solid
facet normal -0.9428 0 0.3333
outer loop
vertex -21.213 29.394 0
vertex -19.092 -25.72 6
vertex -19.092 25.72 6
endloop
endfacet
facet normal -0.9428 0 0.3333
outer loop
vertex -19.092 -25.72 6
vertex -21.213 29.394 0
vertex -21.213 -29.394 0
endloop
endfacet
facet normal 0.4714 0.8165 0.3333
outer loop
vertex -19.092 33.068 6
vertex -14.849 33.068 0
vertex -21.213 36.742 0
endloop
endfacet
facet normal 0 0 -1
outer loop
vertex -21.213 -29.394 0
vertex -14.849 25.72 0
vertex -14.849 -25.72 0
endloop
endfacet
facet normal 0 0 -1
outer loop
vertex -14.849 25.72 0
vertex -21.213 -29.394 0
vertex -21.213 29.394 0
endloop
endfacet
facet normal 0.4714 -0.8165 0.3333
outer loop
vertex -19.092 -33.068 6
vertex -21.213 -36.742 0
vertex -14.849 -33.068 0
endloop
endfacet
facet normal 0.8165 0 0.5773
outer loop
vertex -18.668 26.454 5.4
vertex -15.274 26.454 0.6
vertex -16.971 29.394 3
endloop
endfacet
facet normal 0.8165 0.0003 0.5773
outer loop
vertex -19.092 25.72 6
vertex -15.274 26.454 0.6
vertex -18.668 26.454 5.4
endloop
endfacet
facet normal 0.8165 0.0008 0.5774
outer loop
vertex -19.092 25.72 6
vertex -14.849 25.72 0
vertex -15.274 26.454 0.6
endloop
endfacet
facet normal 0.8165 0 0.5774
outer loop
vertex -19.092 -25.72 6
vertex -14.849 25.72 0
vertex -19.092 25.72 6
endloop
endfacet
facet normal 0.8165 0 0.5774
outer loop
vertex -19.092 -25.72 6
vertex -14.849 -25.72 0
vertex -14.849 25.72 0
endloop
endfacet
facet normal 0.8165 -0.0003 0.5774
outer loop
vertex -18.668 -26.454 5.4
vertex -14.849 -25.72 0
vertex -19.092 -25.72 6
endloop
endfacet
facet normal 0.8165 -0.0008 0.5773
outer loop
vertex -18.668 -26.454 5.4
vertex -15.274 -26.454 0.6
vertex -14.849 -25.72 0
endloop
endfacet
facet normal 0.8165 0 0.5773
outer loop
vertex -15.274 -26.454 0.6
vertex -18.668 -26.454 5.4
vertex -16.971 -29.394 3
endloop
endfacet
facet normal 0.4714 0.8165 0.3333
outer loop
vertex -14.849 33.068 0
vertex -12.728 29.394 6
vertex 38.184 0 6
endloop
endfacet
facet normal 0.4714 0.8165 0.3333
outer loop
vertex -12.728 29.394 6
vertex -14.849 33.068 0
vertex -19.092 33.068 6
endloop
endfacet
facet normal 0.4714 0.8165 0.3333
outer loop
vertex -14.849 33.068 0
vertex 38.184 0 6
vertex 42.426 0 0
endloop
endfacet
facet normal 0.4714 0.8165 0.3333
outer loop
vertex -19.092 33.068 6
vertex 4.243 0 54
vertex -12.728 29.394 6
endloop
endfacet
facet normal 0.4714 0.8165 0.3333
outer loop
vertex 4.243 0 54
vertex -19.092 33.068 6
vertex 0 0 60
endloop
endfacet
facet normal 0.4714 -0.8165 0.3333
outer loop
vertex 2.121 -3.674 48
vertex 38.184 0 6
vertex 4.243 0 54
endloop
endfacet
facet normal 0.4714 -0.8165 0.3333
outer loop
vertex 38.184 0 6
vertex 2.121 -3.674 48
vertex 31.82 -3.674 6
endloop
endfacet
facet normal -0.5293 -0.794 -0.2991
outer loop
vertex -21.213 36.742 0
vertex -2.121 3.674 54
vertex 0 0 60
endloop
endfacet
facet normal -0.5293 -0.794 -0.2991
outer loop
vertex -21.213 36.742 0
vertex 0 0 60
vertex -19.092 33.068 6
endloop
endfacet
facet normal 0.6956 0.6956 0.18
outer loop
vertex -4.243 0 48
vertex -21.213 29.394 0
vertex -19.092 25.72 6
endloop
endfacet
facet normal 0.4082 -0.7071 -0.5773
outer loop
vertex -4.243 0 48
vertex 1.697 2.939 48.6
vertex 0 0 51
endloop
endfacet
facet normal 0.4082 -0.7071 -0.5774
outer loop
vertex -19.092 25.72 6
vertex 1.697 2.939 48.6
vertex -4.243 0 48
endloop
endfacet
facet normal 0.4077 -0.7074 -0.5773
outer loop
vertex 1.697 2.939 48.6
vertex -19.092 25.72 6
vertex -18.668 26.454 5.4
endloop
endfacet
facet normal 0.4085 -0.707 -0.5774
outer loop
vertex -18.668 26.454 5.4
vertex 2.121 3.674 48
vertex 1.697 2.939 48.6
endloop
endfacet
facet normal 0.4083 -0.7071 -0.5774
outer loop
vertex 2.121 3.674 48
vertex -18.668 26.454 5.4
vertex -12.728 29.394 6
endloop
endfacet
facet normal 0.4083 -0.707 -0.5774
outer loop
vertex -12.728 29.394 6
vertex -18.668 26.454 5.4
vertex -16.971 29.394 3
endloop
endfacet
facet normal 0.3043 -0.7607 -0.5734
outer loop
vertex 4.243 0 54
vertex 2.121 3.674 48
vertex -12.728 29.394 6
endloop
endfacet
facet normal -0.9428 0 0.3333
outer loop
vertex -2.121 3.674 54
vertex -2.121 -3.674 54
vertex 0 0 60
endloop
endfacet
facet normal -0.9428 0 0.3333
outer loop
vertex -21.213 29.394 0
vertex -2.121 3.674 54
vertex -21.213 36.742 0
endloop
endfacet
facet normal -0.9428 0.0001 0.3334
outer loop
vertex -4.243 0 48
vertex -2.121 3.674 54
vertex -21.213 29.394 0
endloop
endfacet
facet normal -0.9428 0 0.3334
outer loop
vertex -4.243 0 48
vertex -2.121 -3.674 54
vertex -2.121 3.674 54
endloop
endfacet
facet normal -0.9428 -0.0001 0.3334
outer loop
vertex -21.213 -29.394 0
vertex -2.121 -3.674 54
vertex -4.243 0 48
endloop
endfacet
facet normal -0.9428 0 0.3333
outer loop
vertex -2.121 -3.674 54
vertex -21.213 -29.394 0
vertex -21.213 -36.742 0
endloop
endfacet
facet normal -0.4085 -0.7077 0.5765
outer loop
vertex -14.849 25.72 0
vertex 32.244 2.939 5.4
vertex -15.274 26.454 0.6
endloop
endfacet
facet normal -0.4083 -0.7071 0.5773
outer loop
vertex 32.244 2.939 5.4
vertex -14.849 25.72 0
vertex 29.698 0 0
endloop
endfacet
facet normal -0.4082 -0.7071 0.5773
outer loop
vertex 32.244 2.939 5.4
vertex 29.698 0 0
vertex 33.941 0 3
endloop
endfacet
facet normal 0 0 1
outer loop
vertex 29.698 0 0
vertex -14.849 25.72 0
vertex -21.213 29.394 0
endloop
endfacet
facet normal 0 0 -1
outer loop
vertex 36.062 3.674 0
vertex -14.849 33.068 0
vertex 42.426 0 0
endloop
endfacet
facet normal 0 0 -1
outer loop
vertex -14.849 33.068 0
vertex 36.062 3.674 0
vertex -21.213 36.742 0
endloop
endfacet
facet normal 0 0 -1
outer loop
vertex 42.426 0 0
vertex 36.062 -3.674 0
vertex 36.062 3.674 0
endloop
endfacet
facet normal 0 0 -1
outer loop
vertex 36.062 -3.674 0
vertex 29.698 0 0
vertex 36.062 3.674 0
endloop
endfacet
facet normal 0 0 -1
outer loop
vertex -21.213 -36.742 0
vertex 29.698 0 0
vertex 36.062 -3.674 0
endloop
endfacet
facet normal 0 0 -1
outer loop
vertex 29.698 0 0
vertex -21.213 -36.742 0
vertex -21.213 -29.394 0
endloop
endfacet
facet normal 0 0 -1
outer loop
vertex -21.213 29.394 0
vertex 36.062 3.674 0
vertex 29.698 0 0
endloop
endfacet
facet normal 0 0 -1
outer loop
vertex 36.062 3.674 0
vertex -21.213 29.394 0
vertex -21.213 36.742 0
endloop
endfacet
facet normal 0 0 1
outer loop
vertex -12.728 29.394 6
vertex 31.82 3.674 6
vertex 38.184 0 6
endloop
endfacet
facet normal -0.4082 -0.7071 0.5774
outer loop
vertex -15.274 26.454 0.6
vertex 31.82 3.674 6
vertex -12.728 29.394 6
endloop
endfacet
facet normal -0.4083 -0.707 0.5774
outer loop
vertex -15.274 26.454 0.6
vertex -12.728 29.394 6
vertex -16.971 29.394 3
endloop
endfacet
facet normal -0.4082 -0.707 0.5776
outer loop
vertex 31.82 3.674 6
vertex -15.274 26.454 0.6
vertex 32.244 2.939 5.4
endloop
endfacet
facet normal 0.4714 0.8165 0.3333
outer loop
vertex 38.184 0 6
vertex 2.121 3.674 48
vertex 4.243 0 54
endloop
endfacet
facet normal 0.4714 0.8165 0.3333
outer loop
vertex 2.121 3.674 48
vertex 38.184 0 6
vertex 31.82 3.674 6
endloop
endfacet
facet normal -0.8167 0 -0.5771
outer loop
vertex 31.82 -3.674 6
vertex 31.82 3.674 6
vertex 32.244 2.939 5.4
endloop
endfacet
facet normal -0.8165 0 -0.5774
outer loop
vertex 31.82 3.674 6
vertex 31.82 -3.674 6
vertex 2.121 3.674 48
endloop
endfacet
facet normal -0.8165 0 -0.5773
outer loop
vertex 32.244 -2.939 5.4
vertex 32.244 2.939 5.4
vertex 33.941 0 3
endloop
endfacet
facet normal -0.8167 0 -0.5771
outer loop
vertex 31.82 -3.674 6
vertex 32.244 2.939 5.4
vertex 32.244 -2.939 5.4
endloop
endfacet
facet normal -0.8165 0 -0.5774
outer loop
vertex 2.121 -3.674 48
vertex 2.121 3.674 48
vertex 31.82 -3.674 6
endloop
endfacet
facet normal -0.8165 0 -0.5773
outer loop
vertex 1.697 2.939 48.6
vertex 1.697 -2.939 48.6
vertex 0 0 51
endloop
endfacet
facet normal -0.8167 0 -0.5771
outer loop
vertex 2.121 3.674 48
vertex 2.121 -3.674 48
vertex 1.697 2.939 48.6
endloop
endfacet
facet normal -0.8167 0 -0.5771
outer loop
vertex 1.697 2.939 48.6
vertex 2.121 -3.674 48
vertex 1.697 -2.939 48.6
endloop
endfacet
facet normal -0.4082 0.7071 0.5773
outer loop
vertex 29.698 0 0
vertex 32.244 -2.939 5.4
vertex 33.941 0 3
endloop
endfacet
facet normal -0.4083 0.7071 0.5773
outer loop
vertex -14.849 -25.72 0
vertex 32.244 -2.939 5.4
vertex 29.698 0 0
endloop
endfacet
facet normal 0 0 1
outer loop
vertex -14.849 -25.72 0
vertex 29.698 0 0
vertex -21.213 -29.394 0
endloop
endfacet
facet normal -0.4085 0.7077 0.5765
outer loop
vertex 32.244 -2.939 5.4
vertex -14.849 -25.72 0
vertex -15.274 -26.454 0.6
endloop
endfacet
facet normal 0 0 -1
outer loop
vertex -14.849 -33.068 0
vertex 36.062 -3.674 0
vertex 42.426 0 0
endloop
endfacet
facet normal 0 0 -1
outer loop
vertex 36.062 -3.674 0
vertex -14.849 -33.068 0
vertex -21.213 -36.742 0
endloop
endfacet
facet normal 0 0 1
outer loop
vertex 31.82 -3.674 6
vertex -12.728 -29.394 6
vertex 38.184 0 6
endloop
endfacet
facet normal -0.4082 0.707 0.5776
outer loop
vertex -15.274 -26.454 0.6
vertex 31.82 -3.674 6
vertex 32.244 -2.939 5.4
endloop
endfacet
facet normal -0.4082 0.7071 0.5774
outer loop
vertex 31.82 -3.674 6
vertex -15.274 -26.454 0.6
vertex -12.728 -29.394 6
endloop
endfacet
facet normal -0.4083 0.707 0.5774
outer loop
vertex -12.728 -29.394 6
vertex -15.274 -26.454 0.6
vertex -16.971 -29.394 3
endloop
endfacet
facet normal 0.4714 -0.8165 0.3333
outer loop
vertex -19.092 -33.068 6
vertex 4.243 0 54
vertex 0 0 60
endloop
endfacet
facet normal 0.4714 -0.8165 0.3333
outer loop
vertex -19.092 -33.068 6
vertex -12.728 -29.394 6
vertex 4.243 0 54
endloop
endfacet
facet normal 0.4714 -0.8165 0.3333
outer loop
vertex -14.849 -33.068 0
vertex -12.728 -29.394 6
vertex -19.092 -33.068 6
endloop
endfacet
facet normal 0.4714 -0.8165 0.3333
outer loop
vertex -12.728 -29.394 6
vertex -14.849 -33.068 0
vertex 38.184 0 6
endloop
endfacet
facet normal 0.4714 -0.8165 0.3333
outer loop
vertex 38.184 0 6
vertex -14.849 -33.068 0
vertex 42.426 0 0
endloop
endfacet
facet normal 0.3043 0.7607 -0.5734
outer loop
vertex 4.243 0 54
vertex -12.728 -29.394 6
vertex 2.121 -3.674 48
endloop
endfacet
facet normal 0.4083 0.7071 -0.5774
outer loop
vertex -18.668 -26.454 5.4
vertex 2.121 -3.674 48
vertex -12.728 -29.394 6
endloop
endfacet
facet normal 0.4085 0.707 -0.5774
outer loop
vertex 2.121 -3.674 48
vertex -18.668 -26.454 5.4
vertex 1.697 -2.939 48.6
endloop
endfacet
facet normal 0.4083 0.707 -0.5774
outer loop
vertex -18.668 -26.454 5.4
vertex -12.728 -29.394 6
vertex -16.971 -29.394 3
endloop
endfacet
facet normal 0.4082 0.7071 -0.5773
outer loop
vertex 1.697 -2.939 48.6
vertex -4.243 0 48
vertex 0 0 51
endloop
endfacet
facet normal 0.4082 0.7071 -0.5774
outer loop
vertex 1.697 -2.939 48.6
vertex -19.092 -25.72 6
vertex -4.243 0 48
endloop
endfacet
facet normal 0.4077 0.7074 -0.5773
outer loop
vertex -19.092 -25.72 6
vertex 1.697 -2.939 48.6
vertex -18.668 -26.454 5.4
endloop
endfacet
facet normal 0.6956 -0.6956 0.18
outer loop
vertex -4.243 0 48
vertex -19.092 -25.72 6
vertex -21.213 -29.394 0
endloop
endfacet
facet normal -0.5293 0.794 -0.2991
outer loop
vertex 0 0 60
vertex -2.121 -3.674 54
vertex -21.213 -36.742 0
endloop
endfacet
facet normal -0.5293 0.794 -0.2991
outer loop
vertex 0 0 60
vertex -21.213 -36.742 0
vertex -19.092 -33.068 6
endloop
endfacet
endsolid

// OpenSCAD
// file: polyhedra.scad
// shape height
//sh = 30;
// border width
//bw = 3;

//poly_wire(octahedron);

function sum0(v, i, r) = i < len(v) ? sum0(v, i + 1, r + v[i]) : r;
function sum(v) = sum0(v, 1, v[0]);
function avg(v) = sum(v) / len(v);

function face_center(poly, fid = 0) =
    let(vs = poly[0])
    let(f = poly[1][fid])
    avg([for (p = f) vs[p]]);
    
function face_dist(poly, fid = 0) =
    norm(face_center(poly, fid));        
    
module face_rotate(poly, fid = 0) {
    c = face_center(poly, fid);
    az = c.x == 0 ? 90 : -atan(c.y / c.x);
    rz = [
        [cos(az), -sin(az), 0],
        [sin(az), cos(az), 0],
        [0, 0, 1],
    ] * c;
    ay = atan(rz.x / rz.z);
    rotate([0, ay, 0]) rotate([0, 0, az])
        children();
}

module poly_fill0(poly, bw = bw, fid = 0) {
    scale(bw / 2 / face_dist(poly, fid)) 
        polyhedron(poly[0], poly[1]);    
}

module poly_wire0(poly, sh = sh, bw = bw, fid = 0) {
    s = (sh - bw) / 2 / face_dist(poly, fid);
    vs = poly[0];
    for (f = poly[1]) {
        n = len(f);
        for (i = [0:n - 1]) {
            j = (i + 1) % n;
            p = f[i];
            q = f[j];
            if (p < q) {
                hull() {
                    translate(vs[p] * s) poly_fill0(poly, bw, fid);
                    translate(vs[q] * s) poly_fill0(poly, bw, fid);
                }                
            }
        }
    }        
}

module poly_wire(poly, sh = sh, bw = bw, fid = 0) {
    translate([0, 0, sh / 2])
        face_rotate(poly, fid)
            poly_wire0(poly, sh, bw, fid);
}

// --------------------- Platonic Solids ---------------------

phi = (sqrt(5) + 1) / 2;

tetrahedron = [[
    [-1, 0, -1/sqrt(2)], // 0
    [1, 0, -1/sqrt(2)], // 1
    [0, -1, 1/sqrt(2)], // 2
    [0, 1, 1/sqrt(2)] // 3
], [
    [0, 1, 3],
    [0, 2, 1],
    [0, 3, 2],
    [1, 2, 3]
]];

cube = [[
    [1, 1, -1], // 0
    [-1, 1, -1], // 1
    [-1, -1, -1], // 2
    [1, -1, -1], // 3
    [1, 1, 1], // 4
    [-1, 1, 1], // 5
    [-1, -1, 1], // 6
    [1, -1, 1], // 7
], [
    [0, 1, 2, 3],
    [0, 4, 5, 1],
    [1, 5, 6, 2],
    [2, 6, 7, 3],
    [3, 7, 4, 0],
    [4, 7, 6, 5]
]];

octahedron = [[
    [0, 0, -1], // 0
    [1, 0, 0], // 1
    [0, 1, 0], // 2
    [-1, 0, 0], // 3
    [0, -1, 0], // 4
    [0, 0, 1] // 5
], [
    [0, 1, 2],
    [0, 2, 3],
    [0, 3, 4],
    [0, 4, 1],
    [5, 2, 1],
    [5, 3, 2],
    [5, 4, 3],
    [5, 1, 4]
]];

dodecahedron = [[
    [-1/phi, 0, -phi], // 0
    [1/phi, 0, -phi], // 1
    [-1, -1, -1], // 2
    [-1, 1, -1], // 3
    [1, -1, -1], // 4
    [1, 1, -1], // 5
    [0, -phi, -1/phi], // 6
    [0, phi, -1/phi], // 7
    [-phi, -1/phi, 0], // 8
    [-phi, 1/phi, 0], // 9
    [phi, -1/phi, 0], // 10
    [phi, 1/phi, 0], // 11
    [0, -phi, 1/phi], // 12
    [0, phi, 1/phi], // 13
    [-1, -1, 1], // 14
    [-1, 1, 1], // 15
    [1, -1, 1], // 16
    [1, 1, 1], // 17
    [-1/phi, 0, phi], // 18
    [1/phi, 0, phi] // 19    
], [
    [0, 1, 5, 7, 3],
    [1, 0, 2, 6, 4],
    [0, 3, 9, 8, 2],
    [1, 4, 10, 11, 5],
    [8, 14, 12, 6, 2],
    [6, 12, 16, 10, 4],
    [7, 13, 15, 9, 3],
    [13, 7, 5, 11, 17],
    [8, 9, 15, 18, 14],
    [11, 10, 16, 19, 17],
    [18, 19, 16, 12, 14],
    [19, 18, 15, 13, 17]
]];

icosahedron = [[
    [0, -1, -phi], // 0
    [0, 1, -phi], // 1
    [-phi, 0, -1], // 2
    [phi, 0, -1], // 3
    [-1, -phi, 0], // 4
    [-1, phi, 0], // 5
    [1, -phi, 0], // 6
    [1, phi, 0], // 7
    [-phi, 0, 1], // 8
    [phi, 0, 1], // 9
    [0, -1, phi], // 10
    [0, 1, phi] // 11    
], [
    [0, 1, 2],
    [1, 0, 3],
    [0, 2, 4],
    [2, 1, 5],
    [1, 3, 7],
    [3, 0, 6],
    [1, 7, 5],
    [0, 4, 6],
    [2, 8, 4],
    [2, 5, 8],
    [3, 6, 9],
    [3, 9, 7],
    [4, 10, 6],
    [5, 7, 11],
    [8, 10, 4],
    [5, 11, 8],
    [9, 11, 7],
    [6, 10, 9],
    [8, 11, 10],
    [9, 10, 11]
]];
// main file
// shape height
sh = 30;
// border width
bw = 3;

include <polyhedra.scad>;

poly_wire(tetrahedron);
